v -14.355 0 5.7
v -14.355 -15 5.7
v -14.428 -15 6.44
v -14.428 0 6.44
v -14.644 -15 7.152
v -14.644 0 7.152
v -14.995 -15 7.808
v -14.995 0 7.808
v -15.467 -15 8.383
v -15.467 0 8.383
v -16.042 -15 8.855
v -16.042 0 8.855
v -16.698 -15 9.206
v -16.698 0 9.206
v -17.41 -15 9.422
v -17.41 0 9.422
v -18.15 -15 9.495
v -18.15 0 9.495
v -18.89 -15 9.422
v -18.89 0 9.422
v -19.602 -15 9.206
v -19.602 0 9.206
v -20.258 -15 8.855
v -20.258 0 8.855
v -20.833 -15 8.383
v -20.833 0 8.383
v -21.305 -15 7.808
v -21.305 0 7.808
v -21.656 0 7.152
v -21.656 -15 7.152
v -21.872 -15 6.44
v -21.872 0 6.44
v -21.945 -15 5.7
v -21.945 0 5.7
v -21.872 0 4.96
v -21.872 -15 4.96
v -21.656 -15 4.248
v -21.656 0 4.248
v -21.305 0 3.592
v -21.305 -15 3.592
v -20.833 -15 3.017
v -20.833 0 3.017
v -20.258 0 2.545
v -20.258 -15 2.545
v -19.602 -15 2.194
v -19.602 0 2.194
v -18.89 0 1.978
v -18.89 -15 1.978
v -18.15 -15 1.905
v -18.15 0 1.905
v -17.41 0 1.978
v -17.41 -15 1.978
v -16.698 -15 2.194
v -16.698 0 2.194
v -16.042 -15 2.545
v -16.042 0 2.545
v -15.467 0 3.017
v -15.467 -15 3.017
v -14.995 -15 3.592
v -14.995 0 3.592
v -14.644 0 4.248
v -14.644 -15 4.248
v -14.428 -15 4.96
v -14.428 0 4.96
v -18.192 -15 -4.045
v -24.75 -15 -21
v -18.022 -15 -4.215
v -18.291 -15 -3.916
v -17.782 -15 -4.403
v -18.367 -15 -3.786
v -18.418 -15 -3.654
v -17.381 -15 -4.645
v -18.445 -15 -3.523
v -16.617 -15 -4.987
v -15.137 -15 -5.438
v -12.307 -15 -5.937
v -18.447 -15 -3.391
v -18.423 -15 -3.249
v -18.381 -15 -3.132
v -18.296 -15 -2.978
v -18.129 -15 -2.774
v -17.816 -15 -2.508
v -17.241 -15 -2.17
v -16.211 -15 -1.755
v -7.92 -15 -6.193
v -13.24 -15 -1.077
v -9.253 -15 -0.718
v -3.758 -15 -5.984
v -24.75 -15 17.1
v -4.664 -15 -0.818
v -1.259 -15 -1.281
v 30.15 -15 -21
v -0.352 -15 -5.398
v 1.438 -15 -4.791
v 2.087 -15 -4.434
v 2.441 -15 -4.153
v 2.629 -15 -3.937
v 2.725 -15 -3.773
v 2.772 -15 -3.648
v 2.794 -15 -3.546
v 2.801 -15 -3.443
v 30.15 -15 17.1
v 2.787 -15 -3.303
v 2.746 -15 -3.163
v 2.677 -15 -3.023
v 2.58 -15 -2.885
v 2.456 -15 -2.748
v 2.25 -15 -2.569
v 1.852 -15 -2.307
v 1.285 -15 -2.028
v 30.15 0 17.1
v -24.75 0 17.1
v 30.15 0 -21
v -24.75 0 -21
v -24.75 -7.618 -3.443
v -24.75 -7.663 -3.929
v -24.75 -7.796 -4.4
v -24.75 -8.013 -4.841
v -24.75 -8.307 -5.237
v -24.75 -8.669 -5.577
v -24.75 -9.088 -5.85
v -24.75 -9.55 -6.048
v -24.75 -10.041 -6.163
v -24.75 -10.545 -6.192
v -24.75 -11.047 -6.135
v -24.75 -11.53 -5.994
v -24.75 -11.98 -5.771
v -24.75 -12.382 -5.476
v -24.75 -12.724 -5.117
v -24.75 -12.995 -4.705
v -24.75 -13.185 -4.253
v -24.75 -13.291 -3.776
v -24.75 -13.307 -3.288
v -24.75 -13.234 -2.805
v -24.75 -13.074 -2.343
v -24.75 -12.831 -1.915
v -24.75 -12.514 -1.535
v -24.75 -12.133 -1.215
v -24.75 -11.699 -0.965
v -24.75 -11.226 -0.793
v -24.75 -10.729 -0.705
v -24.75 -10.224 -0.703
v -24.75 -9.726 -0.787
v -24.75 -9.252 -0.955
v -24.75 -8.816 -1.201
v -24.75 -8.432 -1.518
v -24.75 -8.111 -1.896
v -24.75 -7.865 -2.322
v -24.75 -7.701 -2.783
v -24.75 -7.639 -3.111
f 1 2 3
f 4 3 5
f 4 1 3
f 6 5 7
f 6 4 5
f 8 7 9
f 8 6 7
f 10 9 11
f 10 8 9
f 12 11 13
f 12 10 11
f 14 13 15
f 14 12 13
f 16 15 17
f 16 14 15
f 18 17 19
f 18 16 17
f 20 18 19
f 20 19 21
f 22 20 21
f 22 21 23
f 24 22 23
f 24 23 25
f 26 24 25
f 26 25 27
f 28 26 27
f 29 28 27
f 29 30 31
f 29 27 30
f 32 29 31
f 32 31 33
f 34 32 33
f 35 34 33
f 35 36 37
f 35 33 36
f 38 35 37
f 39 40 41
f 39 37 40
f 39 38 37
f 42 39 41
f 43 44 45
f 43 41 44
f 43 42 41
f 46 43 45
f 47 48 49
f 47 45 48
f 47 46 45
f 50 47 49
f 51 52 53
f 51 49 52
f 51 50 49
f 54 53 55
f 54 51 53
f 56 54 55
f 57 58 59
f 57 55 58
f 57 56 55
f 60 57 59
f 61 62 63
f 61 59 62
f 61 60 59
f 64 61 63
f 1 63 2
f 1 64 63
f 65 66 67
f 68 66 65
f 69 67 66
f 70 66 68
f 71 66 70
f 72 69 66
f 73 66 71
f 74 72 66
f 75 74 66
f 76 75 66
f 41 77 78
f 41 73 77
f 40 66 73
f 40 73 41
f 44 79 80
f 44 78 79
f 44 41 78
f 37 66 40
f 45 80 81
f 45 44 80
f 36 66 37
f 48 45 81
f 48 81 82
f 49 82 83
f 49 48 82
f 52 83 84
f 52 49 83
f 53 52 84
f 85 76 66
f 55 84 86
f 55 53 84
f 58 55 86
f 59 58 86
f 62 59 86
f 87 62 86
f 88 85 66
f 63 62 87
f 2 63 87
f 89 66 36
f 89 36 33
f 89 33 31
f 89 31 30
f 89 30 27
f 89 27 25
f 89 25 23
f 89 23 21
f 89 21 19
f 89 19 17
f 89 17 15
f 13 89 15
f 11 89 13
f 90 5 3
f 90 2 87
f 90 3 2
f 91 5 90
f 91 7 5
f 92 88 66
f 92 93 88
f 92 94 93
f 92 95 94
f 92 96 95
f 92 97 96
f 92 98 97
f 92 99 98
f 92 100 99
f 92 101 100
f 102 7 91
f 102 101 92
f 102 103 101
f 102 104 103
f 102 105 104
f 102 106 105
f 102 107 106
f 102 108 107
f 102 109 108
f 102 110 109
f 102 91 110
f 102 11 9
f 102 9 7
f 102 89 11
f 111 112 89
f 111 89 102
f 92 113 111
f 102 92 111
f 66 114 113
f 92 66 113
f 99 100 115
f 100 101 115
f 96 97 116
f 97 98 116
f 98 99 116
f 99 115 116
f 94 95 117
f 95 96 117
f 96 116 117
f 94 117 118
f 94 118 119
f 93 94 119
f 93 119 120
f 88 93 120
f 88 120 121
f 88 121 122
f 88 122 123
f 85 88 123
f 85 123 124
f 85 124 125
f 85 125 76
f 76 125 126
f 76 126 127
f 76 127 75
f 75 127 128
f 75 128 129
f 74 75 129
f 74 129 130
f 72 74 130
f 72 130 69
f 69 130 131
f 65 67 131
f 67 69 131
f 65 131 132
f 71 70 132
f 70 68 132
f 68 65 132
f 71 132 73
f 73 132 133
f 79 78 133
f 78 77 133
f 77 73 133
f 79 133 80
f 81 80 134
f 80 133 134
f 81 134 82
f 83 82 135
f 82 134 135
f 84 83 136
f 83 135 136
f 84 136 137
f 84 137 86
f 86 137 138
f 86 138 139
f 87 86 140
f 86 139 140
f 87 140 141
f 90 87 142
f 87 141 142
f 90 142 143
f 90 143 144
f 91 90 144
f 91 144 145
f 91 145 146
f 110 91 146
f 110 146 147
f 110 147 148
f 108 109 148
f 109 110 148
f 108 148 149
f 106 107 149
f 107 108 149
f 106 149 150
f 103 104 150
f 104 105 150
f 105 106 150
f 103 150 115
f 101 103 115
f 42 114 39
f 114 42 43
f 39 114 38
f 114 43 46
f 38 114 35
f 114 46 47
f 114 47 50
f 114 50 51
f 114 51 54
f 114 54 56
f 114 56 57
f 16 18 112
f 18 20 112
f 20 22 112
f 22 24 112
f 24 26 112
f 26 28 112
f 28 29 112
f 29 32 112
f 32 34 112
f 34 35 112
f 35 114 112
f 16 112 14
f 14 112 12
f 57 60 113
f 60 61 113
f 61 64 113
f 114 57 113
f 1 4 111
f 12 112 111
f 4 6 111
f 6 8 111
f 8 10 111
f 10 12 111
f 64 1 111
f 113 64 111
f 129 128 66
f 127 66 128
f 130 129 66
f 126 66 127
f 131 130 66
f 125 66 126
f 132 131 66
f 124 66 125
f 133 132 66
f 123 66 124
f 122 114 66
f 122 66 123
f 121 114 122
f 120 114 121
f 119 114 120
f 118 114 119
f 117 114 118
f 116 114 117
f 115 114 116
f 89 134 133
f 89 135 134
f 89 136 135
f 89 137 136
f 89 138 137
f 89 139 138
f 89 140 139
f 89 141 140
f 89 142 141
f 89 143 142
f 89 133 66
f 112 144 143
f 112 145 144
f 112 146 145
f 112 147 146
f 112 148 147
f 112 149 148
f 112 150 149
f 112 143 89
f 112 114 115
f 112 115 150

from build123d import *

# Parameters (mm, degrees)
F0_W     = 54.9000054598
F0_H     = 38.1000023335
F1_DEPTH = 15
F4_D     = 5.5
F5_R     = 3.7947326362
F6_DEPTH = 25


with BuildPart() as f1:
    # F0 (on Front) → F1 (new body)
    with BuildSketch(Plane.XZ):
        with Locations((2.7000010014, -1.9500004128)):
            Rectangle(F0_W, F0_H)
    extrude(amount=F1_DEPTH)

    # F4 (through all)
    with Locations(Plane(origin=(31.8803364434, -8.5423104044, 0), x_dir=(-0.2588190451, -0.9659258263, 0), z_dir=(0.9659258263, -0.2588190451, 0))):
        with Locations((16.5139008313, 3.4433358815)):
            Hole(F4_D / 2)

    # F5 (on Front) → F6 (cut)
    with BuildSketch(Plane.XZ):
        with Locations((-18.1499999017, 5.7000000961)):
            Circle(F5_R)
    extrude(amount=F6_DEPTH, mode=Mode.SUBTRACT)


solid = f1.part
